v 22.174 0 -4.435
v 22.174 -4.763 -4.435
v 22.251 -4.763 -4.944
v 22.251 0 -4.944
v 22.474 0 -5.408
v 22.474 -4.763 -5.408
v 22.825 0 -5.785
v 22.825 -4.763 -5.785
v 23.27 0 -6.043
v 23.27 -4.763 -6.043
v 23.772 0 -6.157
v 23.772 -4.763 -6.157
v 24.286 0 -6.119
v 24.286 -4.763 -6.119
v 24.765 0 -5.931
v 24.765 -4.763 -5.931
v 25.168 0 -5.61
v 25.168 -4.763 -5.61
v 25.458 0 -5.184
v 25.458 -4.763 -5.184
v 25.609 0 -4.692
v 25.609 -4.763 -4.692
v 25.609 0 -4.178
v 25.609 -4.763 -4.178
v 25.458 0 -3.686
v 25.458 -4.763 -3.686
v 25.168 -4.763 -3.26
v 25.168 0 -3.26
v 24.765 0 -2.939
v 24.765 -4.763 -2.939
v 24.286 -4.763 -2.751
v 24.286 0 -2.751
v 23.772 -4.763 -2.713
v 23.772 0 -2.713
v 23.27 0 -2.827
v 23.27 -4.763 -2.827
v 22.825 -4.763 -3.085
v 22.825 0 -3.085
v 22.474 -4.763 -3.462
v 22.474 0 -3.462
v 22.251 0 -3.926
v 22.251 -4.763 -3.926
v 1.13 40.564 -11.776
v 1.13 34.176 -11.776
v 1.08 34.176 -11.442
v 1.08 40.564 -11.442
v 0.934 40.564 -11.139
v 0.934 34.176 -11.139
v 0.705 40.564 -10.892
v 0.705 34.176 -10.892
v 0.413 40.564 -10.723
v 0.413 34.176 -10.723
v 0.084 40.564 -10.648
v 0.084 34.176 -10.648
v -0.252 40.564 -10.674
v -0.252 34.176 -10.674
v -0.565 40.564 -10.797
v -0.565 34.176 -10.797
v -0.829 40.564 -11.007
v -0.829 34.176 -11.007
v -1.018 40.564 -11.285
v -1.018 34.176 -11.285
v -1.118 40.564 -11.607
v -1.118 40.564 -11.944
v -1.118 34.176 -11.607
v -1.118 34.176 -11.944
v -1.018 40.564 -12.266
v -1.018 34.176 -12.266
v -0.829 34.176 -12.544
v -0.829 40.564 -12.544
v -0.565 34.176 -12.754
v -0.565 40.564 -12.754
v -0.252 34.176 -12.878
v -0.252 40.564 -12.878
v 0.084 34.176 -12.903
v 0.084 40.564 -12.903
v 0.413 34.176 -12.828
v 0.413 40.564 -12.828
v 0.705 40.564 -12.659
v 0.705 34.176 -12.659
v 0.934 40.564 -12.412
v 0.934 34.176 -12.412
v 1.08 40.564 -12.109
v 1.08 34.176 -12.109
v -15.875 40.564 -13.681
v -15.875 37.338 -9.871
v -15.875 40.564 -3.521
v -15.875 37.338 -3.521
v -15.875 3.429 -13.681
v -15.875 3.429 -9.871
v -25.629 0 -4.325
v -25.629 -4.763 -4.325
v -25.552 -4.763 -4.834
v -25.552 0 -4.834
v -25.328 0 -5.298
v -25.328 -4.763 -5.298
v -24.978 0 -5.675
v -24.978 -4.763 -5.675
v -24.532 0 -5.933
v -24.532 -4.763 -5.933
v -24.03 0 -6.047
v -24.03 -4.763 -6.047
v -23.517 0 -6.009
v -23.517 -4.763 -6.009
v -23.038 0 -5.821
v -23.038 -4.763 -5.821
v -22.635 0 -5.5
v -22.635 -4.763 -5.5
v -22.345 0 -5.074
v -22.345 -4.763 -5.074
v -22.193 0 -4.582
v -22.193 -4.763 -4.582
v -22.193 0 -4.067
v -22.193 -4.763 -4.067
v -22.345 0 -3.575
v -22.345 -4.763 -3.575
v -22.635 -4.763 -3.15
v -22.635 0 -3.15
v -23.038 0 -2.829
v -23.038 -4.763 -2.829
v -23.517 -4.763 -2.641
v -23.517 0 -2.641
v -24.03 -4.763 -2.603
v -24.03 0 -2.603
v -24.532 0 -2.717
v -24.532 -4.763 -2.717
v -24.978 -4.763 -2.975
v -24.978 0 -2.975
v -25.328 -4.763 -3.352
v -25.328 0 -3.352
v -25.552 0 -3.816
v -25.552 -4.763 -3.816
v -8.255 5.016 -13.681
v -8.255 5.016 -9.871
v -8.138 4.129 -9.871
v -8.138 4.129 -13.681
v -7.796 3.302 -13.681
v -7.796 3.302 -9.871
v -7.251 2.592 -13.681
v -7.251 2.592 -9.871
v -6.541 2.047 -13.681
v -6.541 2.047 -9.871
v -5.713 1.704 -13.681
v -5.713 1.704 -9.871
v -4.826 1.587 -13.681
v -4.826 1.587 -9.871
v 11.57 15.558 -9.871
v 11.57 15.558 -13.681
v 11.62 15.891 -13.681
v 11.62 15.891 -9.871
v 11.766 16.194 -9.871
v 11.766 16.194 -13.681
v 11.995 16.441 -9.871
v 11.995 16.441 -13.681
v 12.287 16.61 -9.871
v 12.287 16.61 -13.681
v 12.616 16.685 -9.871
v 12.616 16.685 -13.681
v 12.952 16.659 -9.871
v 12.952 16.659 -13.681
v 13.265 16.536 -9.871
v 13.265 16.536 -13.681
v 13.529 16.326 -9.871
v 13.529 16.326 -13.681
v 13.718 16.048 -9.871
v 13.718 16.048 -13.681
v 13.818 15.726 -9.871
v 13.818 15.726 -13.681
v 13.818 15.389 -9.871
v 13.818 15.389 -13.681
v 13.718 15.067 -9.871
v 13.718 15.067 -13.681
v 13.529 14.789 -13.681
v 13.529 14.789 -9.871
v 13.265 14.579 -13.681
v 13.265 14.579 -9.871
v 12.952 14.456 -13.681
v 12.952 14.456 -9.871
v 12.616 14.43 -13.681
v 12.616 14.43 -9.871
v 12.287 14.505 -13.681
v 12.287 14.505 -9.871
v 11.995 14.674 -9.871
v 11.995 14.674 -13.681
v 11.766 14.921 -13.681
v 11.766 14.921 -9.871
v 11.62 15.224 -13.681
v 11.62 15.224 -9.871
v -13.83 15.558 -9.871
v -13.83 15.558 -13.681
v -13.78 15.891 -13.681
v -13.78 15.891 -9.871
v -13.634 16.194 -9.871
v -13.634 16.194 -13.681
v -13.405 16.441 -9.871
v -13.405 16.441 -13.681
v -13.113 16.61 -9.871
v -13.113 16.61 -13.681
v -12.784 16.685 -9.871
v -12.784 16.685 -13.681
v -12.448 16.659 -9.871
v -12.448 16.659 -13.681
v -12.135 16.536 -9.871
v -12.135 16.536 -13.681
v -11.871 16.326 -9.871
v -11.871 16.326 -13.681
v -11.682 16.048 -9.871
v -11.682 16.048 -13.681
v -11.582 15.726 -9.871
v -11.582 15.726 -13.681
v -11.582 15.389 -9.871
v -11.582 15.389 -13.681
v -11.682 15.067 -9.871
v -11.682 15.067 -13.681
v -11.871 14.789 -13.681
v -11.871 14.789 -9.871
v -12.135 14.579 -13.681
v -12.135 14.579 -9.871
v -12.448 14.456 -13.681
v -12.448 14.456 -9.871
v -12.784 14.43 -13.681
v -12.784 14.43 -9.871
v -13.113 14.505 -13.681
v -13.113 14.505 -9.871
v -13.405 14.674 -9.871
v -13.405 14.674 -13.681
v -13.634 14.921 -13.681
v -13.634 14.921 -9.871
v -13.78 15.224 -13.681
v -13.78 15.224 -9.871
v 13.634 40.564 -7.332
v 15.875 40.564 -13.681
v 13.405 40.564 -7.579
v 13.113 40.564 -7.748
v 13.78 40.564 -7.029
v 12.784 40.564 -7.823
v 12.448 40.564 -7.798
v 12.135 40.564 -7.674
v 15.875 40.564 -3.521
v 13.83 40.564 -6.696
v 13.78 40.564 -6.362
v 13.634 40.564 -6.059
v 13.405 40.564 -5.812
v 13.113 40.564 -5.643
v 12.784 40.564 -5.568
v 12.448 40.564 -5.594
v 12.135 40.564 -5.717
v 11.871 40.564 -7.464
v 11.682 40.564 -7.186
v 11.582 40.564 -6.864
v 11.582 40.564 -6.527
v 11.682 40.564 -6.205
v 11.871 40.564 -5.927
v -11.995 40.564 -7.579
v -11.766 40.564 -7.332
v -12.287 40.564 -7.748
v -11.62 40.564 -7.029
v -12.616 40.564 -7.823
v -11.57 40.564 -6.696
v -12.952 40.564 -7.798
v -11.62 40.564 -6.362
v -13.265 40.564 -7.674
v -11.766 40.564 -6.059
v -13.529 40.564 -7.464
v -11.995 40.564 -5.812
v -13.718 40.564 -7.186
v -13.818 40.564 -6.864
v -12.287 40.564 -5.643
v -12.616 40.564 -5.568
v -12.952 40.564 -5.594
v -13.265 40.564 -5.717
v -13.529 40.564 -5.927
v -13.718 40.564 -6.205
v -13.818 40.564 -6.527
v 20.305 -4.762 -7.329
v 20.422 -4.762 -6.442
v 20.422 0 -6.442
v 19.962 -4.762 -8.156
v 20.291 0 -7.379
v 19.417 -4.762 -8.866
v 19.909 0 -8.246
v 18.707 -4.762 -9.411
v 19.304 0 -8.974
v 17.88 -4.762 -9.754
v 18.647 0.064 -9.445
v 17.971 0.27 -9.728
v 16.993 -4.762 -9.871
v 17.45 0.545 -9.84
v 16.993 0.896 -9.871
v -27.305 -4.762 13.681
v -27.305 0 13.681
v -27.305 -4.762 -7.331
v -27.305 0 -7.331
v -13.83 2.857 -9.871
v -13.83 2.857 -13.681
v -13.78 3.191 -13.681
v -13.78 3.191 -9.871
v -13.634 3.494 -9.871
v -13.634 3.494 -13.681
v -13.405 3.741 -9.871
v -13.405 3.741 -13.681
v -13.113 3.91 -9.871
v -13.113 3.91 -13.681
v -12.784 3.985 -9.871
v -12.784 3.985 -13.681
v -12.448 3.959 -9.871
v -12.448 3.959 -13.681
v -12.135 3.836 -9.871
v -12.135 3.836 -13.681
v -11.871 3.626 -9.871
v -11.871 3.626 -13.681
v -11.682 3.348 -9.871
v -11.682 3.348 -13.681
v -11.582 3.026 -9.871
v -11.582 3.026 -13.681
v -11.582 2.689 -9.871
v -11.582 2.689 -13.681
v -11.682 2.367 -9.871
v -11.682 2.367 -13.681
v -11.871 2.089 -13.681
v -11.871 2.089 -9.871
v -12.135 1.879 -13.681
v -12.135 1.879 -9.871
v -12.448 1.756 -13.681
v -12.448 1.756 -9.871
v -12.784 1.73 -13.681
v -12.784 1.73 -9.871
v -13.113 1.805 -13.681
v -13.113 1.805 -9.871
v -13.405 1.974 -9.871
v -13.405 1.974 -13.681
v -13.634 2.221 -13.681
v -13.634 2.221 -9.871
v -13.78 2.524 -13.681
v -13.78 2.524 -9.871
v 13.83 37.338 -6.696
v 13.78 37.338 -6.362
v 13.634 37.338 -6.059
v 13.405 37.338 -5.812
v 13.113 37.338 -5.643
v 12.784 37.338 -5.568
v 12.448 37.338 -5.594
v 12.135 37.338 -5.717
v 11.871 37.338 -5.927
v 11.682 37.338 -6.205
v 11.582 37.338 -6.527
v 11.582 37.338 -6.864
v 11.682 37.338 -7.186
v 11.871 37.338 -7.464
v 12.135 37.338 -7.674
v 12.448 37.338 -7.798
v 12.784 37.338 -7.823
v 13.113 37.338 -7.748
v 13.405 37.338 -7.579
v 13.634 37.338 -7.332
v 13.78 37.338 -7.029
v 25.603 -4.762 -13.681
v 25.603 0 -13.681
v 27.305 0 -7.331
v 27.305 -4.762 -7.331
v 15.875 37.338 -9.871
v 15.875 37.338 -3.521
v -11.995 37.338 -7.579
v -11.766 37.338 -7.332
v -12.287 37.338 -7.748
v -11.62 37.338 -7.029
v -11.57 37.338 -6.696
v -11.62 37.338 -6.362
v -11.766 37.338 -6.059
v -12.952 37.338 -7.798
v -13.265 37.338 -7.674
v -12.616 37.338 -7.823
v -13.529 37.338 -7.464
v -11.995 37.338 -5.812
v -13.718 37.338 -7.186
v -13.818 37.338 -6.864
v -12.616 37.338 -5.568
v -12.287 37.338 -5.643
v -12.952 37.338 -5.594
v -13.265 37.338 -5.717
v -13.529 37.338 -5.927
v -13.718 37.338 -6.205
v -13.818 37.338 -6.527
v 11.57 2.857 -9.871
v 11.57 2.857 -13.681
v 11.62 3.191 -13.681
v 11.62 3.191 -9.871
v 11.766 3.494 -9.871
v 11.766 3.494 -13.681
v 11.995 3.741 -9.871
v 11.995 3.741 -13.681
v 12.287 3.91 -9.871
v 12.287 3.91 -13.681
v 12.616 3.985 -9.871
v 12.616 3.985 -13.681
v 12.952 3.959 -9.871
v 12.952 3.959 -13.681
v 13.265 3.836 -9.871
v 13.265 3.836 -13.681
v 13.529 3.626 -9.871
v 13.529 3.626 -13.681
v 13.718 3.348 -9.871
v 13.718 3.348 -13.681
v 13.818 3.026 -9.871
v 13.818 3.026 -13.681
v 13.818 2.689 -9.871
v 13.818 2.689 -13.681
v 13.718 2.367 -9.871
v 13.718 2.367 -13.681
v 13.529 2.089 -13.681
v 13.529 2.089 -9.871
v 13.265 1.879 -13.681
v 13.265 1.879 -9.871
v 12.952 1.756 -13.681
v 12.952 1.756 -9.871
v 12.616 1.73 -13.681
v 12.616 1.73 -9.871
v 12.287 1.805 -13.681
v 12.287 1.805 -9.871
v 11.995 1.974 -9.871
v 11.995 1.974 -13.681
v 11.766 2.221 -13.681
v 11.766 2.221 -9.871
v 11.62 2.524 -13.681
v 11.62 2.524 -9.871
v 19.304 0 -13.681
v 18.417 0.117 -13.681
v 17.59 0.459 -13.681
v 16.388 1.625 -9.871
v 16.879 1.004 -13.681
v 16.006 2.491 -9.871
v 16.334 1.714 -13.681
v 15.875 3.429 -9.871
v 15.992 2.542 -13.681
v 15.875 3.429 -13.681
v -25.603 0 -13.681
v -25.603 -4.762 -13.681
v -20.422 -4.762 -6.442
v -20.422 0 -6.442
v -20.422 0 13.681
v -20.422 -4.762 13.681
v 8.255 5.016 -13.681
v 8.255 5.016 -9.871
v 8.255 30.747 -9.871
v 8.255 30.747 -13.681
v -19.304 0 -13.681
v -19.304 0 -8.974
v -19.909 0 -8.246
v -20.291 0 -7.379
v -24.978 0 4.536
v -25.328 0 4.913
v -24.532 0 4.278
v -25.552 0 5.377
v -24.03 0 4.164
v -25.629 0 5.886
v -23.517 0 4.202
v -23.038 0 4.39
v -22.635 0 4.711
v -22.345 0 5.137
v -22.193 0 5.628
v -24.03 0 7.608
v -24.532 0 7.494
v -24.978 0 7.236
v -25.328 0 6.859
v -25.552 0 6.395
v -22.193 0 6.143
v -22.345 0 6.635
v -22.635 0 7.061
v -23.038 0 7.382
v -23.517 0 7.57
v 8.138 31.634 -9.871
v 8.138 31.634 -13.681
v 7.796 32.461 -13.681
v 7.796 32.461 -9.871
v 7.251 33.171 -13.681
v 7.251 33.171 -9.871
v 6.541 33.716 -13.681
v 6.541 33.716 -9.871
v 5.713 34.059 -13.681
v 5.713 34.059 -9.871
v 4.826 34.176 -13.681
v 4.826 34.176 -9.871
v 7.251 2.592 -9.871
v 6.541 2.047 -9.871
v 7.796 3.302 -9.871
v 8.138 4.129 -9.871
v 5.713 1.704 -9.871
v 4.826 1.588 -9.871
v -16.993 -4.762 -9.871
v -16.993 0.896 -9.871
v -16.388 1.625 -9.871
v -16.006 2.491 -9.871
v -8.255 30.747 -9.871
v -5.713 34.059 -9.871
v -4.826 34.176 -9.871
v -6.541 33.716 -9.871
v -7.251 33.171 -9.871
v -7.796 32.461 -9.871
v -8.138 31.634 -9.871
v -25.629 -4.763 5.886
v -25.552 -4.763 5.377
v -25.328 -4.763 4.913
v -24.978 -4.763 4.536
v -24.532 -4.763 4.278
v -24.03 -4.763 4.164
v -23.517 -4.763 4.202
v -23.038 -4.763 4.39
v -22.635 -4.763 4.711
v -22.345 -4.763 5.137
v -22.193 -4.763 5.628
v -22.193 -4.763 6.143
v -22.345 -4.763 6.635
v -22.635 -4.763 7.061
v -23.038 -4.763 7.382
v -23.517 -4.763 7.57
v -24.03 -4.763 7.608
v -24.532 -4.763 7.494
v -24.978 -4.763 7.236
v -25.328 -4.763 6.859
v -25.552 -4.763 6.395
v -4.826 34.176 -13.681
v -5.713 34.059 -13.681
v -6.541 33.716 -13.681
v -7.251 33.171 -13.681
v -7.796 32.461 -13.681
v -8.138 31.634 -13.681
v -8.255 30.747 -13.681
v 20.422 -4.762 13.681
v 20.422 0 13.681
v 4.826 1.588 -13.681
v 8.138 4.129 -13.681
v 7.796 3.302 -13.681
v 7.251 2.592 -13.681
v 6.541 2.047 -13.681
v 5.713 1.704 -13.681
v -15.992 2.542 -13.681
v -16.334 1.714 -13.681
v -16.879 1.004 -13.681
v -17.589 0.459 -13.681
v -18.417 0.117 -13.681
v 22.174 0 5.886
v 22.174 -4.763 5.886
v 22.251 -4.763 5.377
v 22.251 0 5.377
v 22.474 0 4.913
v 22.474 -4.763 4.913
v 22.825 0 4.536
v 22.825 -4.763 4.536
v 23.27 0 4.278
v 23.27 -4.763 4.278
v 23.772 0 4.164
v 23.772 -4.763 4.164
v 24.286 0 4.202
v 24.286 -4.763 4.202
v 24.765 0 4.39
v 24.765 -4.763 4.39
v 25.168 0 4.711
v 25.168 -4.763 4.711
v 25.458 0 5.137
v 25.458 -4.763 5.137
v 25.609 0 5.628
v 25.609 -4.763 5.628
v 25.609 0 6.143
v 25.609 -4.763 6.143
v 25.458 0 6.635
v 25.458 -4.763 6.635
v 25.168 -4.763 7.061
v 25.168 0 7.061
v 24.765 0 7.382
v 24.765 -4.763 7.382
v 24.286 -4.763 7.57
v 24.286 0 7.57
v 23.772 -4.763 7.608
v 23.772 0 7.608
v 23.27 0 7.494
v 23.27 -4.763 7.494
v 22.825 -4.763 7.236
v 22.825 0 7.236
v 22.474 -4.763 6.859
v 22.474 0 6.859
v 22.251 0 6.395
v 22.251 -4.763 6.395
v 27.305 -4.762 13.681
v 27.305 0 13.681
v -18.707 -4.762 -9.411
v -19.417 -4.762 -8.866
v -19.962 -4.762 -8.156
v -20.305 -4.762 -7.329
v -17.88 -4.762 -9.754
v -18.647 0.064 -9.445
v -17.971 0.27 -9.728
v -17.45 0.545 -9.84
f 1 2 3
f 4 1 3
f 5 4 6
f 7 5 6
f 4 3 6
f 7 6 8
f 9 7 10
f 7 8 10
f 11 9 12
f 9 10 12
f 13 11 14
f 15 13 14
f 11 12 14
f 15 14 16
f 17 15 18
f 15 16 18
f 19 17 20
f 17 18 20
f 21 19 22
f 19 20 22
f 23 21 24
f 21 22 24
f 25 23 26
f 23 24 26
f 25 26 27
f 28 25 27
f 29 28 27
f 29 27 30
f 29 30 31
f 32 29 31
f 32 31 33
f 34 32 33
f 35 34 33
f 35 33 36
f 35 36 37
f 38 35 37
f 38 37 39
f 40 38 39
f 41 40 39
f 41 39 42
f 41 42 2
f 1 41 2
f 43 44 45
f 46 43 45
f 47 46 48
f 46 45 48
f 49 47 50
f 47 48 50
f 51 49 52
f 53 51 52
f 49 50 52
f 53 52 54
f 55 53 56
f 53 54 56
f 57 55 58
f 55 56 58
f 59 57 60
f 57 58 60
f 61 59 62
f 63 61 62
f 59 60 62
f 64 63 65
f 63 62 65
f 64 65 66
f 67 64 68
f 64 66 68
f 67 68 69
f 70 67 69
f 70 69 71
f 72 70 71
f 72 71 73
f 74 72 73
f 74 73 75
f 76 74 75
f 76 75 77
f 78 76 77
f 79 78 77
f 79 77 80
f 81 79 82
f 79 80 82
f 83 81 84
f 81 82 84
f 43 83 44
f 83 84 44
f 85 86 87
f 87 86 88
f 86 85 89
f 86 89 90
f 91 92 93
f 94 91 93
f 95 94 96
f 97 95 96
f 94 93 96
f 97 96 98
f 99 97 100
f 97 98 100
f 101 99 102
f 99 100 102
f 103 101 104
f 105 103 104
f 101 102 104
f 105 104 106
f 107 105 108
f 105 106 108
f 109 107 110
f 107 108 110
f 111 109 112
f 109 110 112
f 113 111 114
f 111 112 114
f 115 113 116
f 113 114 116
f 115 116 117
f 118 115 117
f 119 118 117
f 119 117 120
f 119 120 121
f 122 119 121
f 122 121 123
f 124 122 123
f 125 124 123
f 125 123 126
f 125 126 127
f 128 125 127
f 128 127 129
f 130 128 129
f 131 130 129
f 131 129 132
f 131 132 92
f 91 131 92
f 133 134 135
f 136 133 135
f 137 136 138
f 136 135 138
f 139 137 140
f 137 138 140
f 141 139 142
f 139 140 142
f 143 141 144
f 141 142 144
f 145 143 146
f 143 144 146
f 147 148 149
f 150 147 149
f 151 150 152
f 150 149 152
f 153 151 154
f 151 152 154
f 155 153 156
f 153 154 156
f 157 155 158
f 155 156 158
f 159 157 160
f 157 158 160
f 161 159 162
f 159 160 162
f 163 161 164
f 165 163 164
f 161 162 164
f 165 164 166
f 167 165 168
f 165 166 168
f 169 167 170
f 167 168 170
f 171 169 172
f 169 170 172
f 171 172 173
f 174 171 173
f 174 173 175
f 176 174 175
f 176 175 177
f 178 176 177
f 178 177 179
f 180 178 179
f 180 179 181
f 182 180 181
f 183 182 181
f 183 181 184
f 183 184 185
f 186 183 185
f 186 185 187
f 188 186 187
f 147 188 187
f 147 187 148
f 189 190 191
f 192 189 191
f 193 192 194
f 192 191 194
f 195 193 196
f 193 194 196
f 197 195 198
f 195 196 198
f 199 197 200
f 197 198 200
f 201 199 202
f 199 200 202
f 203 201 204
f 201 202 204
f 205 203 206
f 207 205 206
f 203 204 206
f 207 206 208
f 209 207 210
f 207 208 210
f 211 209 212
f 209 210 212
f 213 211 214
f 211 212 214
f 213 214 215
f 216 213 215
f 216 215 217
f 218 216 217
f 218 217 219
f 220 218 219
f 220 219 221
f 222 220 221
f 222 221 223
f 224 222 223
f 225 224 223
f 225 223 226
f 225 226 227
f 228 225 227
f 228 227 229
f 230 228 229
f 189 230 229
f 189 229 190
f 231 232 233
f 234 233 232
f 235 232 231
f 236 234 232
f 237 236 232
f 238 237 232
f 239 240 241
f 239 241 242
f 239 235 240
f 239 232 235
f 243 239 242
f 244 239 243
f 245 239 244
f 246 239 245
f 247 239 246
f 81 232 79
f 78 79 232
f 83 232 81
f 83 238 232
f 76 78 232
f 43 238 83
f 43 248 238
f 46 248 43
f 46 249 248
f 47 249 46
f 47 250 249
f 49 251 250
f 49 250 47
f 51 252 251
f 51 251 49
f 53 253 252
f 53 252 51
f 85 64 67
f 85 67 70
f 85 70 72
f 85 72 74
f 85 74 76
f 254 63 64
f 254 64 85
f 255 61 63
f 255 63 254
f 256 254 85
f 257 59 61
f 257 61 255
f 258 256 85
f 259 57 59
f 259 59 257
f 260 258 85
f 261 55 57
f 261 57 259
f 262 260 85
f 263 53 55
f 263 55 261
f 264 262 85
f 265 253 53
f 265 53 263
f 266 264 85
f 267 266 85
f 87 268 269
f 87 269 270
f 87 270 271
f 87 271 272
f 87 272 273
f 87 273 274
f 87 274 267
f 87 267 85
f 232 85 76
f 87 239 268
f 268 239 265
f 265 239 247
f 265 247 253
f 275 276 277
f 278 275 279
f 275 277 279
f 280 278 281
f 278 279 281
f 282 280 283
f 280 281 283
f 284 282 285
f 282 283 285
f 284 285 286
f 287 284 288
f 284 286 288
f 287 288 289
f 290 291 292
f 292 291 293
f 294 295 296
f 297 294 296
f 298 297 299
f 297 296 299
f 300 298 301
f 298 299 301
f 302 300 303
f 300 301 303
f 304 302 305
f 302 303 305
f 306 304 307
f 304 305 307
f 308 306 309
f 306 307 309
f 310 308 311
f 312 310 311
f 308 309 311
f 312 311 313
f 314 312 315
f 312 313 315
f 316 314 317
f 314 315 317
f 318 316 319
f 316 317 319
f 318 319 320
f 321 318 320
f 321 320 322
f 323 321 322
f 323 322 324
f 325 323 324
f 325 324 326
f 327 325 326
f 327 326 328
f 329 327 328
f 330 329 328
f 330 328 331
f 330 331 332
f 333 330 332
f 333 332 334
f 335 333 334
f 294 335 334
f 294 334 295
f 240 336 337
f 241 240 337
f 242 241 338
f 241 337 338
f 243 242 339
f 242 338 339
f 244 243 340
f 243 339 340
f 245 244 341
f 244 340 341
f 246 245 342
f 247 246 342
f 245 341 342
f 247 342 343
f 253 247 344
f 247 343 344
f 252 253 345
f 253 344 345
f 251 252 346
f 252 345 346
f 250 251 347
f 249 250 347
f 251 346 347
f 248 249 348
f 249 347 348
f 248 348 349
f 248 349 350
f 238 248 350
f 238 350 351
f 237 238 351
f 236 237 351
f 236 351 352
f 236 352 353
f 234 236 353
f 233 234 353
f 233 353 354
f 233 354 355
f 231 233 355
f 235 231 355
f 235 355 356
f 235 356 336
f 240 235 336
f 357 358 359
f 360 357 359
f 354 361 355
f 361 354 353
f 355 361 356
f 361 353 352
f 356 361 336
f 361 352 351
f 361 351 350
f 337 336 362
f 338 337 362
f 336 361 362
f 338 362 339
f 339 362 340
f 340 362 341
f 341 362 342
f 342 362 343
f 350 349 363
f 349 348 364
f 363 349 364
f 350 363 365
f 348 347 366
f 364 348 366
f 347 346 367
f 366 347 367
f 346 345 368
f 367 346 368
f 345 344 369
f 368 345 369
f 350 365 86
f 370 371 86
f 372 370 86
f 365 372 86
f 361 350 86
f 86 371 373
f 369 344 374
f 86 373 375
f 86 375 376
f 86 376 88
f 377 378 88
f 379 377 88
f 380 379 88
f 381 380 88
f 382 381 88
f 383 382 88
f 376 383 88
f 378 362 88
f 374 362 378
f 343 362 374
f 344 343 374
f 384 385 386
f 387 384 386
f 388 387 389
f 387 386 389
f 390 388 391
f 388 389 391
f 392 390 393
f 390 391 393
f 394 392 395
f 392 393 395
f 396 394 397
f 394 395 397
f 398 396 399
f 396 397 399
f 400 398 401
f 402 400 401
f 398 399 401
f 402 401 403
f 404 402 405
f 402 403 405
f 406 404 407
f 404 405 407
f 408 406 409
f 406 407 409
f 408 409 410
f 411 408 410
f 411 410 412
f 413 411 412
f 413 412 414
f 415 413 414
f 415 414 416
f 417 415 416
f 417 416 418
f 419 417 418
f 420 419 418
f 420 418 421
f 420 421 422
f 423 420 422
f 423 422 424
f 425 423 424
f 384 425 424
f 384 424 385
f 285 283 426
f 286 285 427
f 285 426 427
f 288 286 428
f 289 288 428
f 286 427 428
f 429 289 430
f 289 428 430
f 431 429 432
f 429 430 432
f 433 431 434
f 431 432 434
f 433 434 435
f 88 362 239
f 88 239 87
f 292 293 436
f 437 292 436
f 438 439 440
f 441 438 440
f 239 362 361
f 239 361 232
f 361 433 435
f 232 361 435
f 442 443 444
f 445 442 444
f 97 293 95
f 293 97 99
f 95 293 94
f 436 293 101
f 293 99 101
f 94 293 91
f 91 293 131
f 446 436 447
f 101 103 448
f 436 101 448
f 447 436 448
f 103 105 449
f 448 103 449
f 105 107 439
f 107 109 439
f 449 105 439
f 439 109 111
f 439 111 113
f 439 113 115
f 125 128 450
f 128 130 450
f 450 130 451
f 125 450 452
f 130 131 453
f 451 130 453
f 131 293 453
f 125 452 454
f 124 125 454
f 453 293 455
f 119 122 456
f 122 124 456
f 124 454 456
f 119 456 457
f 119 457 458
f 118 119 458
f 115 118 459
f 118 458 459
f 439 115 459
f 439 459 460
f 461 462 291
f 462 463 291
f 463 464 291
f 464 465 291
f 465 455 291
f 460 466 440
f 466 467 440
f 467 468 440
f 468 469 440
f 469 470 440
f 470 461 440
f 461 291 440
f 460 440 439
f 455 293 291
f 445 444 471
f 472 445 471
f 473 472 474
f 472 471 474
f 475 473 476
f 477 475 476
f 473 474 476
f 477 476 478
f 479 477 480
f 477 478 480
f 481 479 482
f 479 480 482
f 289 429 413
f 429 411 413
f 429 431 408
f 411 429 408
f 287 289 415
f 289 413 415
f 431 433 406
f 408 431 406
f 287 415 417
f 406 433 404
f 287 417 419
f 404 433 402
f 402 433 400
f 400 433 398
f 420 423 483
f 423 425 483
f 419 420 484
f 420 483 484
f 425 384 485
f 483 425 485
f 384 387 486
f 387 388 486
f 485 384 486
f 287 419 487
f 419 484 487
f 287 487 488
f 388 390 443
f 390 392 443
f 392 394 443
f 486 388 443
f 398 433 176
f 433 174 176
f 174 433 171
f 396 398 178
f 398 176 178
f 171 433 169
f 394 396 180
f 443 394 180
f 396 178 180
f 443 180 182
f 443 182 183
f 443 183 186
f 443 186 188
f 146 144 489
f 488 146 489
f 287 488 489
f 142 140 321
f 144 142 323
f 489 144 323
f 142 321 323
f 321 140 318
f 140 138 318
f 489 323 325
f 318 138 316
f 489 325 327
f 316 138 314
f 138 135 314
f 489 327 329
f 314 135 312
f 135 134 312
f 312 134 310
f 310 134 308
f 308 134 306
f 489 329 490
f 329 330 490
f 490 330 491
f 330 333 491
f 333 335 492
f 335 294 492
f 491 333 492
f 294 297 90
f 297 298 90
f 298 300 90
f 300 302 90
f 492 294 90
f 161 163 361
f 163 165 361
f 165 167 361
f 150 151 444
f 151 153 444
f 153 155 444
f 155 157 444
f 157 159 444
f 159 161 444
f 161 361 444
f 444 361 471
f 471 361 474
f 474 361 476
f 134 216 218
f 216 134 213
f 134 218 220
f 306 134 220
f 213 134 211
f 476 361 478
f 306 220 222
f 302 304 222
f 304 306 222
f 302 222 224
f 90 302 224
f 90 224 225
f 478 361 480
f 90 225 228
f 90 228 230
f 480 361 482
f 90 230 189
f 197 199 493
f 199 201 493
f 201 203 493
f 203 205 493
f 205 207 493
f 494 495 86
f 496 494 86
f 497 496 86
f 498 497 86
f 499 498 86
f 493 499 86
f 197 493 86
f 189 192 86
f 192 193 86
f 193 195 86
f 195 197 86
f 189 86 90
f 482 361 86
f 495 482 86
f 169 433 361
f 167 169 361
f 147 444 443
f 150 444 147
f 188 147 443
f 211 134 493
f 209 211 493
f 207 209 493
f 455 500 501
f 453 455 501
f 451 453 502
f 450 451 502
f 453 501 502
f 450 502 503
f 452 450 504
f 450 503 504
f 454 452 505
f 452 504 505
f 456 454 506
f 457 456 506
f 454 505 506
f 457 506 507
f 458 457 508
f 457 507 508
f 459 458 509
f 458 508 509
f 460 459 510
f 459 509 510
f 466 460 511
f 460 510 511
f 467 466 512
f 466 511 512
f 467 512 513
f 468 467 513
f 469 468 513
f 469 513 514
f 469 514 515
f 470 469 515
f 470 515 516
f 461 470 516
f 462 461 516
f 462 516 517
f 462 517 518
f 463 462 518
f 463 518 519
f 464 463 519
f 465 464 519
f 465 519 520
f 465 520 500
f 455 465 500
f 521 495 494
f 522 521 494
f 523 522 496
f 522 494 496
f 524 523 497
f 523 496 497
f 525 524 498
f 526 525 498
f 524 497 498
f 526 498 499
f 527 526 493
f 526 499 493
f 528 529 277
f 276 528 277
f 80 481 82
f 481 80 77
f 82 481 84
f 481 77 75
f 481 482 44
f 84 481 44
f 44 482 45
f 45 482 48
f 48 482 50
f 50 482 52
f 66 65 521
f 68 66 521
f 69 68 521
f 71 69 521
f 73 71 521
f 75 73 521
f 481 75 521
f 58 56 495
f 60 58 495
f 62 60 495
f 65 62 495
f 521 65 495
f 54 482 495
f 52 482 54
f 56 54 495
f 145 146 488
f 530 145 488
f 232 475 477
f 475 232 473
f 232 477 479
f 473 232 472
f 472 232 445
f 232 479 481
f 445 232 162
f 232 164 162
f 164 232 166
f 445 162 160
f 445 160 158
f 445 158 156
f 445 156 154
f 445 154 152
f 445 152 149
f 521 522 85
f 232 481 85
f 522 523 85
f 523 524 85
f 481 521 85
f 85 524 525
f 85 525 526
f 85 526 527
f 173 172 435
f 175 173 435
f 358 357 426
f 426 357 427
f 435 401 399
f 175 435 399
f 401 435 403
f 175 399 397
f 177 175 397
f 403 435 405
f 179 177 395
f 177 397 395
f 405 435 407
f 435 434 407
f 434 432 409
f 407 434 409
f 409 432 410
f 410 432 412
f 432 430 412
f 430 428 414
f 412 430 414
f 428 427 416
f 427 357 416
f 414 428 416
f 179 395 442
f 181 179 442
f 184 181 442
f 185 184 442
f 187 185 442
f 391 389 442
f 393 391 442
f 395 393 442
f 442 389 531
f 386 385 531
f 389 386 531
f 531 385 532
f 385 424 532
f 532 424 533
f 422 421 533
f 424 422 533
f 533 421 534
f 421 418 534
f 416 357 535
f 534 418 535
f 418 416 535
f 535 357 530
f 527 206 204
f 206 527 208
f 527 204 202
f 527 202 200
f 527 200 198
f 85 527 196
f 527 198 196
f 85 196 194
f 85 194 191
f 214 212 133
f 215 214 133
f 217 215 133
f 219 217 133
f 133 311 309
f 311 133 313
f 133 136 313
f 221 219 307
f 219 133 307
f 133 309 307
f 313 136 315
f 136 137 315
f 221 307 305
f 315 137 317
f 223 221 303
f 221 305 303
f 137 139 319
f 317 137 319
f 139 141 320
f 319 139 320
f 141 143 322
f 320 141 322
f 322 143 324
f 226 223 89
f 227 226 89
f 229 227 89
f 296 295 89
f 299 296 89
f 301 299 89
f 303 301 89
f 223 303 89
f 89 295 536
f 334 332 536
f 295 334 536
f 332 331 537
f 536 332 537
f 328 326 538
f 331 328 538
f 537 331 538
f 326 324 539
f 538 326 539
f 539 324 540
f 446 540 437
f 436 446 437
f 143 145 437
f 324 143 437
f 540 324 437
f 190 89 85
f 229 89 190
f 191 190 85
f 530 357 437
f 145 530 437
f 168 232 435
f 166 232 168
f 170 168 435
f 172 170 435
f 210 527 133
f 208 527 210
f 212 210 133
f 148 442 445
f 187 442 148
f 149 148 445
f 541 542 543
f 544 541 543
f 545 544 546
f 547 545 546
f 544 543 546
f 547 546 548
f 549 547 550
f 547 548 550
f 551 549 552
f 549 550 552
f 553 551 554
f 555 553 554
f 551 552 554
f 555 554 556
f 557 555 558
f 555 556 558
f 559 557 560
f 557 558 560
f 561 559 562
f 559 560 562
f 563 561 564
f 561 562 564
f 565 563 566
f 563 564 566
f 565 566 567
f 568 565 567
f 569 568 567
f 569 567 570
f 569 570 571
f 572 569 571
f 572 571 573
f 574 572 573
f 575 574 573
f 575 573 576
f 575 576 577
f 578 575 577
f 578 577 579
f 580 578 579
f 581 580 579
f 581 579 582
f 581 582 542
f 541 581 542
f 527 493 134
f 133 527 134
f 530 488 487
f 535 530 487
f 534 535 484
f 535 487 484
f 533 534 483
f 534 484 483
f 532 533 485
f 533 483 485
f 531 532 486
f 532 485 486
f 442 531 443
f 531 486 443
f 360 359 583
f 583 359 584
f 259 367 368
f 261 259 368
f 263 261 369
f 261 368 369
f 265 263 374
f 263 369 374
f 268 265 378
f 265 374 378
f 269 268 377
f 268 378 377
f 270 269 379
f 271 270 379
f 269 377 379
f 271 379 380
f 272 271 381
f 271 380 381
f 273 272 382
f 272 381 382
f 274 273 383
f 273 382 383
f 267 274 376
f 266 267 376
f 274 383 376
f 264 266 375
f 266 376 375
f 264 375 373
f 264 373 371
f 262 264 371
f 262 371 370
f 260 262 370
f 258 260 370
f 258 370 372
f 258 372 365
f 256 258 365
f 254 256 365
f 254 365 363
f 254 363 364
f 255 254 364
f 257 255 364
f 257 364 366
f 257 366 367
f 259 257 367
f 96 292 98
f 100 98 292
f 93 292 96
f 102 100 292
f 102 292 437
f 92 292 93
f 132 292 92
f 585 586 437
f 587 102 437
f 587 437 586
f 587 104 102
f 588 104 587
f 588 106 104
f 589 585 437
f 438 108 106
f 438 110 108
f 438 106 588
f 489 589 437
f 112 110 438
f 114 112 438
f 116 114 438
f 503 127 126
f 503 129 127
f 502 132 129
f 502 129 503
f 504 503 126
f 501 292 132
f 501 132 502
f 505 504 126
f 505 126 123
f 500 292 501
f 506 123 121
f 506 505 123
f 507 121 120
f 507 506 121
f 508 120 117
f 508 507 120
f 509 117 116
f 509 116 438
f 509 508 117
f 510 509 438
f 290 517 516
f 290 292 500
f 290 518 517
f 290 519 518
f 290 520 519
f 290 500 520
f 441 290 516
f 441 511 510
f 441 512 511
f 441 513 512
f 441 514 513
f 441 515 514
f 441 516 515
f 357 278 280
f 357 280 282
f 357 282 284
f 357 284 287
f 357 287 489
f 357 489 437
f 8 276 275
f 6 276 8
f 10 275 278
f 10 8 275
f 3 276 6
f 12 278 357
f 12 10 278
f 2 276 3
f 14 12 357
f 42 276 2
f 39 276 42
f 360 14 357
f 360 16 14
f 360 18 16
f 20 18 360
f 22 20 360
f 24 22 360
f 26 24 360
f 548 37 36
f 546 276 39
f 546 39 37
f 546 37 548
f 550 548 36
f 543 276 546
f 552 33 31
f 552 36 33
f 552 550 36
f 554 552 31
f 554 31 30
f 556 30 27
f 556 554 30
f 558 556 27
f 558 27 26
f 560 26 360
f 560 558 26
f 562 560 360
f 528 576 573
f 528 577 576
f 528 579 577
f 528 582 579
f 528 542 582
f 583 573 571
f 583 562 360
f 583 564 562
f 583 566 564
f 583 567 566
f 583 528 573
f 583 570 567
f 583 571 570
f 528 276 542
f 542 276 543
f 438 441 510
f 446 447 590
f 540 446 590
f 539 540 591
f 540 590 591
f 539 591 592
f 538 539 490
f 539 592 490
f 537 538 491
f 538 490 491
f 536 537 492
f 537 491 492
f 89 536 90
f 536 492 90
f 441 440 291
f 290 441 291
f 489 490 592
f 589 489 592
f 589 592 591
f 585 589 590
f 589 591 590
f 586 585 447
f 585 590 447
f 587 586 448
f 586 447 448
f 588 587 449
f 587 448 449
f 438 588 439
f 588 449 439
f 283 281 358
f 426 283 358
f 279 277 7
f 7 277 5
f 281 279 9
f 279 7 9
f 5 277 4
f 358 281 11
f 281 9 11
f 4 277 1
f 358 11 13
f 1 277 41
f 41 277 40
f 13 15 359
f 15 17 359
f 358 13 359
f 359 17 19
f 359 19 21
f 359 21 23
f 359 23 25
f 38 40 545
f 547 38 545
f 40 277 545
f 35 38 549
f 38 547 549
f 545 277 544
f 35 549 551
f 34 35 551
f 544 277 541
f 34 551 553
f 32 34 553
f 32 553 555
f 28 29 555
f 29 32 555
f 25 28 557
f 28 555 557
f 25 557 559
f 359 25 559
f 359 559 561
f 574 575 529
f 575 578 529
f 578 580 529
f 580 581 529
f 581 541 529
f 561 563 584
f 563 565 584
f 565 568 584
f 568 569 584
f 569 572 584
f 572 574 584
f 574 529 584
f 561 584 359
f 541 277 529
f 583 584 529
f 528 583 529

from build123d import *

# Parameters (mm, degrees)
F1_DEPTH  = 4.7625
F3_DEPTH  = 37.338
F4_R      = 3.429
F5_W      = 31.75
F5_H      = 6.35
F5_H_2    = 3.81
F6_DEPTH  = 3.2258
F8_D      = 3.4544
F10_D     = 2.2606
F10_DEPTH = 10.16
F10_TIP   = 0.6791527577
F12_DEPTH = 3.8110001
F14_D     = 2.2606


with BuildPart() as f1:
    # F0 (on Front) → F1 (new body)
    with BuildSketch(Plane.XZ):
        with BuildLine():
            Line((-25.6032, -13.6805935506), (0, -13.6805935506))
            Line((0, -13.6805935506), (25.6032, -13.6805935506))
            Line((25.6032, -13.6805935506), (27.305, -7.3305935506))
            Line((27.305, -7.3305935506), (27.305, 13.6805935506))
            Line((27.305, 13.6805935506), (20.4216, 13.6805935506))
            Line((20.4216, 13.6805935506), (20.4216, -6.4415935506))
            ThreePointArc((20.4216, -6.4415935506), (19.4172691527, -8.8662627033), (16.9926, -9.8705935506))
            Line((16.9926, -9.8705935506), (0, -9.8705935506))
            Line((0, -9.8705935506), (-16.9926, -9.8705935506))
            ThreePointArc((-16.9926, -9.8705935506), (-19.4172691527, -8.8662627033), (-20.4216, -6.4415935506))
            Line((-20.4216, -6.4415935506), (-20.4216, 13.6805935506))
            Line((-20.4216, 13.6805935506), (-27.305, 13.6805935506))
            Line((-27.305, 13.6805935506), (-27.305, -7.3305935506))
            Line((-27.305, -7.3305935506), (-25.6032, -13.6805935506))
        make_face()
    extrude(amount=F1_DEPTH)

    # F2 (on face) → F3 (join)
    with BuildSketch(Plane(origin=(0, 0, 0), x_dir=(-1, 0, 0), z_dir=(0, 1, 0))):
        Polygon((15.875, -9.8705935506), (0, -9.8705935506), (-15.875, -9.8705935506), (-15.875, -13.6805935506), (0, -13.6805935506), (15.875, -13.6805935506), align=None)
    extrude(amount=F3_DEPTH)

    # F4
    f4_edges = [f1.edges().sort_by_distance(p)[0] for p in [
        (15.875, 0, -11.775594),
        (-15.875, 0, -11.775594),
    ]]
    fillet(f4_edges, radius=F4_R)

    # F5 (on face) → F6 (join)
    with BuildSketch(Plane(origin=(0, 37.338, 0), x_dir=(-1, 0, 0), z_dir=(0, 1, 0))):
        with Locations((0, -6.6955935506)):
            Rectangle(F5_W, F5_H)
        with Locations((0, -11.7755935506)):
            Rectangle(F5_W, F5_H_2)
    extrude(amount=F6_DEPTH)

    # F8 (through all)
    with Locations(Plane(origin=(0, 0, 0), x_dir=(1, 0, 0), z_dir=(0, 1, 0))):
        with Locations((-23.9014, -5.8859053767), (-23.9014, 4.3248946233), (23.9014, 4.4349935506), (23.9014, -5.8859053767)):
            Hole(F8_D / 2)

    # F10
    with Locations(Plane(origin=(0, 40.5638, 0), x_dir=(-1, 0, 0), z_dir=(0, 1, 0))):
        with Locations((-12.7, -6.6955935506), (12.7, -6.6955935506), (0, -11.7755935506)):
            Hole(F10_D / 2, depth=F10_DEPTH)
            with Locations((0, 0, -(F10_DEPTH + F10_TIP / 2))):  # 118° drill point
                Cone(0, F10_D / 2, F10_TIP, mode=Mode.SUBTRACT)

    # F11 (on face) → F12 (cut, through all)
    with BuildSketch(Plane.XY.offset(-9.8705935506)):
        with BuildLine():
            Line((-4.826, 1.5875), (4.826, 1.5875))
            ThreePointArc((4.826, 1.5875), (7.2506691527, 2.5918308473), (8.255, 5.0165))
            Line((8.255, 5.0165), (8.255, 30.7467))
            ThreePointArc((8.255, 30.7467), (7.2506691527, 33.1713691527), (4.826, 34.1757))
            Line((4.826, 34.1757), (-4.826, 34.1757))
            ThreePointArc((-4.826, 34.1757), (-7.2506691527, 33.1713691527), (-8.255, 30.7467))
            Line((-8.255, 30.7467), (-8.255, 5.0165))
            ThreePointArc((-8.255, 5.0165), (-7.2506691527, 2.5918308473), (-4.826, 1.5875))
        make_face()
    extrude(amount=-F12_DEPTH, mode=Mode.SUBTRACT)

    # F14 (through all)
    with Locations(Plane.XY.offset(-9.8705935506)):
        with Locations((12.7, 2.8575), (12.7, 15.5575), (-12.7, 2.8575), (-12.7, 15.5575)):
            Hole(F14_D / 2)


solid = f1.part
